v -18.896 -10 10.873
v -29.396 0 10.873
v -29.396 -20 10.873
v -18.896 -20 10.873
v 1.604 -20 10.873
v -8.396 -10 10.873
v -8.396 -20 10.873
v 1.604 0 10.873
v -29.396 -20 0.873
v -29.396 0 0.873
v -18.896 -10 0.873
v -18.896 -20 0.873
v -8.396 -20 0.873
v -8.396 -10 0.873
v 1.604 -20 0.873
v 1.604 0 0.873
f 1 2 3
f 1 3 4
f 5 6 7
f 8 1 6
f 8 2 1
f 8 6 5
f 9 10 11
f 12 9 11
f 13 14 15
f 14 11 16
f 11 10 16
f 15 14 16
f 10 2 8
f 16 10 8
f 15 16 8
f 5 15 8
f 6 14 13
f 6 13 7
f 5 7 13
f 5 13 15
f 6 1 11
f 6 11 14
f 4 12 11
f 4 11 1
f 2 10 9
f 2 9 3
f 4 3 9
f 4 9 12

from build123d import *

# Parameters (mm, degrees)
F0_W     = 10
F0_H     = 10
F0_W_2   = 11
F1_DEPTH = 20
F2_W     = 10.5
F2_H     = 10
F3_DEPTH = 10
F4_DEPTH = 20


with BuildPart() as f1:
    # F0 (on Front) → F1 (new body)
    with BuildSketch(Plane.XZ):
        with Locations((-24.396219, 5.872731)):
            Rectangle(F0_W, F0_H)
        with Locations((-13.896219, 5.872731)):
            Rectangle(F0_W_2, F0_H)
    extrude(amount=F1_DEPTH)

    # F2 (on face) → F3 (cut)
    with BuildSketch(Plane.XZ.offset(20)):
        with Locations((-13.646219, 5.872731)):
            Rectangle(F2_W, F2_H)
    extrude(amount=-F3_DEPTH, mode=Mode.SUBTRACT)

    # F0 (on Front) → F4 (join)
    with BuildSketch(Plane.XZ):
        with Locations((-3.396219, 5.872731)):
            Rectangle(F0_W, F0_H)
    extrude(amount=F4_DEPTH)


solid = f1.part
